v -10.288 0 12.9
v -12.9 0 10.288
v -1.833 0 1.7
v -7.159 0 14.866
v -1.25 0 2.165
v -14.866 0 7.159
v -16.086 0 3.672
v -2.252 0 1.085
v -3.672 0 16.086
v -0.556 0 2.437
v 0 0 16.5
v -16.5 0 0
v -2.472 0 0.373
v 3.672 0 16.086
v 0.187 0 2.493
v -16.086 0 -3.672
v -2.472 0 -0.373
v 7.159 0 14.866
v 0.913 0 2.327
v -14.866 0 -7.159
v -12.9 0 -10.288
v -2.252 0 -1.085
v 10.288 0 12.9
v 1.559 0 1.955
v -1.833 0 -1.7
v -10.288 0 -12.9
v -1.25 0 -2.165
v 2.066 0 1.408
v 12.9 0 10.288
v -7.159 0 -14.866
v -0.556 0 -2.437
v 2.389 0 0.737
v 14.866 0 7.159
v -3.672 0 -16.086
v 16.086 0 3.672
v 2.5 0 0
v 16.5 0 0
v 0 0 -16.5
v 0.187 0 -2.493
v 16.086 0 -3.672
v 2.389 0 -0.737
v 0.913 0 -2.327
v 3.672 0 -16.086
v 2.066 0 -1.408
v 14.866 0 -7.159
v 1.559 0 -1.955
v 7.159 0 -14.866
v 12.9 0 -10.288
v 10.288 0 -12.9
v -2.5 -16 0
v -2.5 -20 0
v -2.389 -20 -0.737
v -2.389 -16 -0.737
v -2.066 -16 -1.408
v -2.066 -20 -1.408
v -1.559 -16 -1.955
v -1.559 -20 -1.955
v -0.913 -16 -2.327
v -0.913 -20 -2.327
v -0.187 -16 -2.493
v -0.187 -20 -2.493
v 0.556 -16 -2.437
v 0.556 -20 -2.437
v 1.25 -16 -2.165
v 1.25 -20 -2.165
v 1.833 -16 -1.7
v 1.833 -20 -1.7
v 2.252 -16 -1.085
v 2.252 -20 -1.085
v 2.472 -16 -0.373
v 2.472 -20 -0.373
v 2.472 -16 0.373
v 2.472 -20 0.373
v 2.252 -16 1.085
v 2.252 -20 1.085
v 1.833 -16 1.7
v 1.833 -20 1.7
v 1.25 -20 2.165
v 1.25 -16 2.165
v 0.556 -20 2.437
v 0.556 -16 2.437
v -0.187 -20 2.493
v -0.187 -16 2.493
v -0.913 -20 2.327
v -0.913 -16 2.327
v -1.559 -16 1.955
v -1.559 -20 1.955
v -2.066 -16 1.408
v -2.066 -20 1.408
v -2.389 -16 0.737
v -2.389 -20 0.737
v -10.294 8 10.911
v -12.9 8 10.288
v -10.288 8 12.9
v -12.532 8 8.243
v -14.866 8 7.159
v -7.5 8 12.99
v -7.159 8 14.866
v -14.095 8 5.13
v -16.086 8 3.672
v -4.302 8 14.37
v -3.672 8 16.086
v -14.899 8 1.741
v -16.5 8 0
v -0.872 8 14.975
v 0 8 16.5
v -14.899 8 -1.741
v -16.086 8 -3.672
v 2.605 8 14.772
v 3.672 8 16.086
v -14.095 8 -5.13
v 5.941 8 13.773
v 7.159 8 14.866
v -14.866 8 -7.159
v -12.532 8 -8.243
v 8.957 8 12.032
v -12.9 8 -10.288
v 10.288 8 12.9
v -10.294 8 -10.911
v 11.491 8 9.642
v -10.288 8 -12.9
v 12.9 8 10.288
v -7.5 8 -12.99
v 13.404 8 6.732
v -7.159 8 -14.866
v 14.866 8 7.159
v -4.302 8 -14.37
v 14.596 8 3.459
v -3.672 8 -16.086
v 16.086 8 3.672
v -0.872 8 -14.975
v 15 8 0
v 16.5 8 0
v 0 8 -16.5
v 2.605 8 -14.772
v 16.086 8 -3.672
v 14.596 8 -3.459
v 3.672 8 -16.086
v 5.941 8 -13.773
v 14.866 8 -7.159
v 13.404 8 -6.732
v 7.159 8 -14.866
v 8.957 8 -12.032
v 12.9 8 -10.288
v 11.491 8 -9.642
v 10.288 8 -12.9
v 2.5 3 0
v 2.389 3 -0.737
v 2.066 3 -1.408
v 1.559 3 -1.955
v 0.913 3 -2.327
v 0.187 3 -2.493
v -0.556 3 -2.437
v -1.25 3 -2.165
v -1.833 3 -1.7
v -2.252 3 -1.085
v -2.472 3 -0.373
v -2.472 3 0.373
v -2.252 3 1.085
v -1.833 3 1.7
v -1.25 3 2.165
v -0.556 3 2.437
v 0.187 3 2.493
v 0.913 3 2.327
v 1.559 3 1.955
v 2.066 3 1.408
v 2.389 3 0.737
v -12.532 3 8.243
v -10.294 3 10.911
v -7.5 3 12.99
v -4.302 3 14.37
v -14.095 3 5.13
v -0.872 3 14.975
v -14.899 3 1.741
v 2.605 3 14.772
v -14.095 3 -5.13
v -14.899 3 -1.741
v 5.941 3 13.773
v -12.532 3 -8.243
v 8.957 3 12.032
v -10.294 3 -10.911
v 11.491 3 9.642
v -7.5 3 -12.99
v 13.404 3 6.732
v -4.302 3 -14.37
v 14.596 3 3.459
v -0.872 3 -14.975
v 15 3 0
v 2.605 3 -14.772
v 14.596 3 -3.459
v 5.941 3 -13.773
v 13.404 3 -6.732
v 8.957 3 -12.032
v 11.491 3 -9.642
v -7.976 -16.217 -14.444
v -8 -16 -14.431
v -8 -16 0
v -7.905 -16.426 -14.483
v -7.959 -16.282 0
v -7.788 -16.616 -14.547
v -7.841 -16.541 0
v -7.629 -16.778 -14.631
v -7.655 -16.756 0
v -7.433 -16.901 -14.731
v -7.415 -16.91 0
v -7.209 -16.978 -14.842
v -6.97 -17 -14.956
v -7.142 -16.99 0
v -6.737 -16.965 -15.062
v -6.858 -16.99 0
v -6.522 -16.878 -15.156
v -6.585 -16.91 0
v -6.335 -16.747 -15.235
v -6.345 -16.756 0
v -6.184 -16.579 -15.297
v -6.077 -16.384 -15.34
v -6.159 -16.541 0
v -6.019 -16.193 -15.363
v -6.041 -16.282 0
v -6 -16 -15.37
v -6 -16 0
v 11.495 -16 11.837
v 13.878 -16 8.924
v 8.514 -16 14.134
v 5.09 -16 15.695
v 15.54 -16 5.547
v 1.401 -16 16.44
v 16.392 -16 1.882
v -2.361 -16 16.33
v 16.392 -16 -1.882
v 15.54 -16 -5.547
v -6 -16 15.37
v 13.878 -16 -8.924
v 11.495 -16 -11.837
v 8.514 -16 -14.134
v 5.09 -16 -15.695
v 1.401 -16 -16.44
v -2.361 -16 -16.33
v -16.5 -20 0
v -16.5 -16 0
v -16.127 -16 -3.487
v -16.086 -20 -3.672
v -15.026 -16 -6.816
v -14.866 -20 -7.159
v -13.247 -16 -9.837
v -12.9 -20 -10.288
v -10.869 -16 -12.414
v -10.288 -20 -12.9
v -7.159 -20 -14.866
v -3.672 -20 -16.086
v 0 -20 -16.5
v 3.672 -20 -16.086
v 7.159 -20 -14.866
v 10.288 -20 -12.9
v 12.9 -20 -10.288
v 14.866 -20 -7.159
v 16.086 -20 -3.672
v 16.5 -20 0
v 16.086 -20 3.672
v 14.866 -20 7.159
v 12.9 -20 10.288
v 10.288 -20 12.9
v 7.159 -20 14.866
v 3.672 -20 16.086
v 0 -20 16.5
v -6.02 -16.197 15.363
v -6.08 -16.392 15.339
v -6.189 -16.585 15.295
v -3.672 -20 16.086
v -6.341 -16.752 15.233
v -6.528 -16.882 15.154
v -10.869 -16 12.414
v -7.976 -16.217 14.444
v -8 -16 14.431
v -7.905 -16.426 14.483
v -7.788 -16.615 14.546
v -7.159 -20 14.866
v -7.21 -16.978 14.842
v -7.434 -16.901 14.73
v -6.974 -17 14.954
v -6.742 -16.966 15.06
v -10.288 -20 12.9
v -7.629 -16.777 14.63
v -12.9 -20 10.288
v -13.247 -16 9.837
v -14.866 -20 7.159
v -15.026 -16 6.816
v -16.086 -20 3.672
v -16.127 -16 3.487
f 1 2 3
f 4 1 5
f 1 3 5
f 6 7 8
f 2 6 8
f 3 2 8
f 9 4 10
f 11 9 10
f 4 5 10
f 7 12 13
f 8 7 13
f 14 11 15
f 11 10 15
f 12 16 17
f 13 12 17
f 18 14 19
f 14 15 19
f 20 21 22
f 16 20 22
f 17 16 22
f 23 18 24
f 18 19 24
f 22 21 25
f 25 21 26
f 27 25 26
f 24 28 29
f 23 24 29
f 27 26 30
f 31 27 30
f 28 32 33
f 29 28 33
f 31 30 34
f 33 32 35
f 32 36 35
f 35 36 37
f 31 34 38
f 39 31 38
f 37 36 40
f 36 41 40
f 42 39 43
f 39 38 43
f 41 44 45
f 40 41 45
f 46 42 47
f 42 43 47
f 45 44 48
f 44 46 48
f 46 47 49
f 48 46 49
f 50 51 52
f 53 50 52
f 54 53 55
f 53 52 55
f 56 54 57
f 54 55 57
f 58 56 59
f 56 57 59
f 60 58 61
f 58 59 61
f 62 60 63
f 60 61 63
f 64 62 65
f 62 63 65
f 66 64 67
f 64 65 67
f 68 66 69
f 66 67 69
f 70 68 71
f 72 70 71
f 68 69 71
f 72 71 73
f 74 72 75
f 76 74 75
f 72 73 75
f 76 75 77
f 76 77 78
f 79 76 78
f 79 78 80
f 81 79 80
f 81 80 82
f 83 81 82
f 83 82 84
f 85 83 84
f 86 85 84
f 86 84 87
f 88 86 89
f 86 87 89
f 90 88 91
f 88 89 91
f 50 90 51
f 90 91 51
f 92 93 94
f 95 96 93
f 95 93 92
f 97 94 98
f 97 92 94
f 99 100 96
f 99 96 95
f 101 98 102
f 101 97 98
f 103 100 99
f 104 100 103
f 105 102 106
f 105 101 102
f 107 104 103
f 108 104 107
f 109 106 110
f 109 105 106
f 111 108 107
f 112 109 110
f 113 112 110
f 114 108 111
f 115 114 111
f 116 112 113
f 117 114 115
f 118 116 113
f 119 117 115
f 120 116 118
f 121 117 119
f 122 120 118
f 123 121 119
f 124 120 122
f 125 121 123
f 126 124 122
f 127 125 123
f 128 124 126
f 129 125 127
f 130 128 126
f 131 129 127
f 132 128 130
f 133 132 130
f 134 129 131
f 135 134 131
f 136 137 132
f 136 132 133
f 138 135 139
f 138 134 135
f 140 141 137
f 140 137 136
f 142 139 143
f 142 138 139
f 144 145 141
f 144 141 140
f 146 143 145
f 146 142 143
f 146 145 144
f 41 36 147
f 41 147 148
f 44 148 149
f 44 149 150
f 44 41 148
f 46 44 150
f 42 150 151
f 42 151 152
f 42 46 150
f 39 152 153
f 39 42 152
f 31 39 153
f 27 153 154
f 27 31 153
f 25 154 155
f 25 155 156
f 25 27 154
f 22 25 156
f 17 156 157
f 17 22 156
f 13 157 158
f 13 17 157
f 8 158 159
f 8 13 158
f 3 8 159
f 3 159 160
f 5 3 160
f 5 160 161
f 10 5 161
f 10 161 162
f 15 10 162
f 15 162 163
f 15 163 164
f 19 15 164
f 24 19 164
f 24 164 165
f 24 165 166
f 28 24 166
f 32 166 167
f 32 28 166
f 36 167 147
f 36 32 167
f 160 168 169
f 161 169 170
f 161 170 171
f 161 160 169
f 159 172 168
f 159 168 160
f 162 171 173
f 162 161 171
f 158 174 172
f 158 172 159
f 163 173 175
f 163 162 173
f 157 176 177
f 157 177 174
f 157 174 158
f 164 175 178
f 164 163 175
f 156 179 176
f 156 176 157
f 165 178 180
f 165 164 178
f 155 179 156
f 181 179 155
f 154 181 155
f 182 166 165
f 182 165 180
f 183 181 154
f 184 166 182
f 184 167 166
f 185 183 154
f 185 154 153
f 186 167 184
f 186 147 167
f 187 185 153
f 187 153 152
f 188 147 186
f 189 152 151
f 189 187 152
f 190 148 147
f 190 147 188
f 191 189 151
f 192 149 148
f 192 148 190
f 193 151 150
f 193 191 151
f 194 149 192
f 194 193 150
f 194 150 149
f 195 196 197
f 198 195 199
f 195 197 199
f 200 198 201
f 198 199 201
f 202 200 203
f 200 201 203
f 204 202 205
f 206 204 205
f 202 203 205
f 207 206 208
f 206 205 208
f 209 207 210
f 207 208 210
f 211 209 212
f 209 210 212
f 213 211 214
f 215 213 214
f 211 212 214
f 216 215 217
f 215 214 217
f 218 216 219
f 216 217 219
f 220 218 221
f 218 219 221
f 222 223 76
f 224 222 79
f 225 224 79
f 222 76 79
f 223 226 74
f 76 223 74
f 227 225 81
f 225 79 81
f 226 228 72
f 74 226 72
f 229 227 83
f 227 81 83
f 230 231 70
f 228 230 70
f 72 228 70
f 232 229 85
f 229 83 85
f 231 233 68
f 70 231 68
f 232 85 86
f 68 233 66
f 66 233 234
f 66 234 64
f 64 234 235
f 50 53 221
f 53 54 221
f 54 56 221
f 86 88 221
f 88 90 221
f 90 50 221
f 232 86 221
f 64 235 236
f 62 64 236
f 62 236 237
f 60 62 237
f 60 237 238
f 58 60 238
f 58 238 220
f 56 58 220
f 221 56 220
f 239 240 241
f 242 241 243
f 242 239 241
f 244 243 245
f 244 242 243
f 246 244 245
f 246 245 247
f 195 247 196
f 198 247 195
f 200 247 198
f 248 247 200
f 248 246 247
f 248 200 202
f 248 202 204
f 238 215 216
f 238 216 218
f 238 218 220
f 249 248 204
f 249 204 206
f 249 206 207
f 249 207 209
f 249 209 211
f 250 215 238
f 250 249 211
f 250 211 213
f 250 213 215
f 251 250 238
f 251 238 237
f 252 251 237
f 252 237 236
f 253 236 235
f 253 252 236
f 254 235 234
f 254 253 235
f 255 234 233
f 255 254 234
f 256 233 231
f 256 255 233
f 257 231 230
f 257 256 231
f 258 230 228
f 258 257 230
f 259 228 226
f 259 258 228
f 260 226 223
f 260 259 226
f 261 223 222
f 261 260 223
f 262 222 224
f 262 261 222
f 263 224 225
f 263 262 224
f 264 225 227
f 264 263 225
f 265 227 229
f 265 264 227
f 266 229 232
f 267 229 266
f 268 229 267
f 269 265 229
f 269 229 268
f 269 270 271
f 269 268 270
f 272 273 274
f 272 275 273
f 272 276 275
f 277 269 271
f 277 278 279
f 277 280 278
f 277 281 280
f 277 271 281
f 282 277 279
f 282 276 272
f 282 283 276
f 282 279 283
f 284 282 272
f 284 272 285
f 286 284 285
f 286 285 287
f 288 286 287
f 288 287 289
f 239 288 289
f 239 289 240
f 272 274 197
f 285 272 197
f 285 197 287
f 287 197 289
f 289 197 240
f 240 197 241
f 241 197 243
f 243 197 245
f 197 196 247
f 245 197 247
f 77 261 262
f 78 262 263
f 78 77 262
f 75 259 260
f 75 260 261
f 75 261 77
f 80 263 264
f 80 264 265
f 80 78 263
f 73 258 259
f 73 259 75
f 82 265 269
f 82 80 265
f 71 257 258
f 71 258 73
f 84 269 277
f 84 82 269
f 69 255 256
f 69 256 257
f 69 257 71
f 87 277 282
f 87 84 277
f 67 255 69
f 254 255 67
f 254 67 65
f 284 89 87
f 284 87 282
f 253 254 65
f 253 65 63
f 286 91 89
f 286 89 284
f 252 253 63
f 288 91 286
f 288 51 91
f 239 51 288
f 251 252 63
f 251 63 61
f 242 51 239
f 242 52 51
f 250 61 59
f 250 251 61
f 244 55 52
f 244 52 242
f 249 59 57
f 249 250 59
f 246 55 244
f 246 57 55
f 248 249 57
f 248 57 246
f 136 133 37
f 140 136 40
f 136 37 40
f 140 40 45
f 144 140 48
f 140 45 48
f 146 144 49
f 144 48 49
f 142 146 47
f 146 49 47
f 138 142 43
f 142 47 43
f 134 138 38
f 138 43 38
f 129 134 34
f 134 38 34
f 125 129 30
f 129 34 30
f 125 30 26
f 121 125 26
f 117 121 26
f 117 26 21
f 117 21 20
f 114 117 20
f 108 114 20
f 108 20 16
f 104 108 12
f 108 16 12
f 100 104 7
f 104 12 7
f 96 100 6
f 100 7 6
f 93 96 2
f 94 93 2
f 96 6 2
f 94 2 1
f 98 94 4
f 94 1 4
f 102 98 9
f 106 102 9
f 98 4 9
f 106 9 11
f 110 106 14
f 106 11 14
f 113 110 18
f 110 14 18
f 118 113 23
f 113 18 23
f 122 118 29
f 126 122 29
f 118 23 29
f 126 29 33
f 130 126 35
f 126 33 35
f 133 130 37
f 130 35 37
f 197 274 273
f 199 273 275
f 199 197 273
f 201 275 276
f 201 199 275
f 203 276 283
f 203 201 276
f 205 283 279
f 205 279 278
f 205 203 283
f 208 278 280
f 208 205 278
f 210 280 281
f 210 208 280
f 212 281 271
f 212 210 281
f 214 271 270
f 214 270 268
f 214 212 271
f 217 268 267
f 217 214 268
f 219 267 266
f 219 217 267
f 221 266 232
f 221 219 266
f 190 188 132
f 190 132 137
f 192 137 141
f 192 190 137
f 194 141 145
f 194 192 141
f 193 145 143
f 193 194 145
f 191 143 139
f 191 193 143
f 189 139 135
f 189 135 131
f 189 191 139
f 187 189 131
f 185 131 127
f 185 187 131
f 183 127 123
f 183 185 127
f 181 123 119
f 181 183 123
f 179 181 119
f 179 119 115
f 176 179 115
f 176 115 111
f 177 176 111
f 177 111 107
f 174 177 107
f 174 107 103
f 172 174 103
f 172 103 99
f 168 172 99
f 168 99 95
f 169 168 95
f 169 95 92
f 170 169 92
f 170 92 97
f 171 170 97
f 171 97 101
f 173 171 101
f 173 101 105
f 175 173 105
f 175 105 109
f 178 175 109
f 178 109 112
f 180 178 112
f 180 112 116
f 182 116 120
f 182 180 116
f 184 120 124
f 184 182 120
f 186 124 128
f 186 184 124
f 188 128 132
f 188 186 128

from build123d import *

# Parameters (mm, degrees)
SCHIZZO1_R                    = 15
SCHIZZO1_R_2                  = 2.5
ESTRUSIONE_ESTRUSIONE1_DEPTH  = 3
SCHIZZO1_5_R                  = 16.5
SCHIZZO1_5_R_2                = 15
ESTRUSIONE_ESTRUSIONE2_DEPTH  = 8
SCHIZZO4_R                    = 16.5
SCHIZZO4_R_2                  = 2.5
ESTRUSIONE_ESTRUSIONE3_DEPTH  = 4
SCHIZZO5_R                    = 1
TAGLIO_ESTRUSIONE1_DEPTH      = 17.5
TAGLIO_ESTRUSIONE1_DEPTH_BACK = 17.5


with BuildPart() as part:
    # Schizzo1 → Estrusione-Estrusione1 (new body)
    with BuildSketch(Plane(origin=(0, 0, 0), x_dir=(1, 0, 0), z_dir=(0, 1, 0))):
        Circle(SCHIZZO1_R)
        Circle(SCHIZZO1_R_2, mode=Mode.SUBTRACT)
    extrude(amount=ESTRUSIONE_ESTRUSIONE1_DEPTH)

    # Schizzo1<5> → Estrusione-Estrusione2 (add)
    with BuildSketch(Plane(origin=(0, 0, 0), x_dir=(1, 0, 0), z_dir=(0, 1, 0))):
        Circle(SCHIZZO1_5_R)
        Circle(SCHIZZO1_5_R_2, mode=Mode.SUBTRACT)
    extrude(amount=ESTRUSIONE_ESTRUSIONE2_DEPTH)


with BuildPart() as body_2:
    # Schizzo4 → Estrusione-Estrusione3 (new body)
    with BuildSketch(Plane(origin=(0, -20, 0), x_dir=(-1, 0, 0), z_dir=(0, -1, 0))):
        Circle(SCHIZZO4_R)
        Circle(SCHIZZO4_R_2, mode=Mode.SUBTRACT)
    extrude(amount=-ESTRUSIONE_ESTRUSIONE3_DEPTH)

    # Schizzo5 → Taglio-Estrusione1 (cut, two sides)
    with BuildSketch(Plane.XY) as taglio_estrusione1_sk:
        with Locations((-7, -16)):
            Circle(SCHIZZO5_R)
    extrude(amount=TAGLIO_ESTRUSIONE1_DEPTH, mode=Mode.SUBTRACT)
    extrude(taglio_estrusione1_sk.sketch, amount=-TAGLIO_ESTRUSIONE1_DEPTH_BACK, mode=Mode.SUBTRACT)


solid = Compound([part.part, body_2.part])
